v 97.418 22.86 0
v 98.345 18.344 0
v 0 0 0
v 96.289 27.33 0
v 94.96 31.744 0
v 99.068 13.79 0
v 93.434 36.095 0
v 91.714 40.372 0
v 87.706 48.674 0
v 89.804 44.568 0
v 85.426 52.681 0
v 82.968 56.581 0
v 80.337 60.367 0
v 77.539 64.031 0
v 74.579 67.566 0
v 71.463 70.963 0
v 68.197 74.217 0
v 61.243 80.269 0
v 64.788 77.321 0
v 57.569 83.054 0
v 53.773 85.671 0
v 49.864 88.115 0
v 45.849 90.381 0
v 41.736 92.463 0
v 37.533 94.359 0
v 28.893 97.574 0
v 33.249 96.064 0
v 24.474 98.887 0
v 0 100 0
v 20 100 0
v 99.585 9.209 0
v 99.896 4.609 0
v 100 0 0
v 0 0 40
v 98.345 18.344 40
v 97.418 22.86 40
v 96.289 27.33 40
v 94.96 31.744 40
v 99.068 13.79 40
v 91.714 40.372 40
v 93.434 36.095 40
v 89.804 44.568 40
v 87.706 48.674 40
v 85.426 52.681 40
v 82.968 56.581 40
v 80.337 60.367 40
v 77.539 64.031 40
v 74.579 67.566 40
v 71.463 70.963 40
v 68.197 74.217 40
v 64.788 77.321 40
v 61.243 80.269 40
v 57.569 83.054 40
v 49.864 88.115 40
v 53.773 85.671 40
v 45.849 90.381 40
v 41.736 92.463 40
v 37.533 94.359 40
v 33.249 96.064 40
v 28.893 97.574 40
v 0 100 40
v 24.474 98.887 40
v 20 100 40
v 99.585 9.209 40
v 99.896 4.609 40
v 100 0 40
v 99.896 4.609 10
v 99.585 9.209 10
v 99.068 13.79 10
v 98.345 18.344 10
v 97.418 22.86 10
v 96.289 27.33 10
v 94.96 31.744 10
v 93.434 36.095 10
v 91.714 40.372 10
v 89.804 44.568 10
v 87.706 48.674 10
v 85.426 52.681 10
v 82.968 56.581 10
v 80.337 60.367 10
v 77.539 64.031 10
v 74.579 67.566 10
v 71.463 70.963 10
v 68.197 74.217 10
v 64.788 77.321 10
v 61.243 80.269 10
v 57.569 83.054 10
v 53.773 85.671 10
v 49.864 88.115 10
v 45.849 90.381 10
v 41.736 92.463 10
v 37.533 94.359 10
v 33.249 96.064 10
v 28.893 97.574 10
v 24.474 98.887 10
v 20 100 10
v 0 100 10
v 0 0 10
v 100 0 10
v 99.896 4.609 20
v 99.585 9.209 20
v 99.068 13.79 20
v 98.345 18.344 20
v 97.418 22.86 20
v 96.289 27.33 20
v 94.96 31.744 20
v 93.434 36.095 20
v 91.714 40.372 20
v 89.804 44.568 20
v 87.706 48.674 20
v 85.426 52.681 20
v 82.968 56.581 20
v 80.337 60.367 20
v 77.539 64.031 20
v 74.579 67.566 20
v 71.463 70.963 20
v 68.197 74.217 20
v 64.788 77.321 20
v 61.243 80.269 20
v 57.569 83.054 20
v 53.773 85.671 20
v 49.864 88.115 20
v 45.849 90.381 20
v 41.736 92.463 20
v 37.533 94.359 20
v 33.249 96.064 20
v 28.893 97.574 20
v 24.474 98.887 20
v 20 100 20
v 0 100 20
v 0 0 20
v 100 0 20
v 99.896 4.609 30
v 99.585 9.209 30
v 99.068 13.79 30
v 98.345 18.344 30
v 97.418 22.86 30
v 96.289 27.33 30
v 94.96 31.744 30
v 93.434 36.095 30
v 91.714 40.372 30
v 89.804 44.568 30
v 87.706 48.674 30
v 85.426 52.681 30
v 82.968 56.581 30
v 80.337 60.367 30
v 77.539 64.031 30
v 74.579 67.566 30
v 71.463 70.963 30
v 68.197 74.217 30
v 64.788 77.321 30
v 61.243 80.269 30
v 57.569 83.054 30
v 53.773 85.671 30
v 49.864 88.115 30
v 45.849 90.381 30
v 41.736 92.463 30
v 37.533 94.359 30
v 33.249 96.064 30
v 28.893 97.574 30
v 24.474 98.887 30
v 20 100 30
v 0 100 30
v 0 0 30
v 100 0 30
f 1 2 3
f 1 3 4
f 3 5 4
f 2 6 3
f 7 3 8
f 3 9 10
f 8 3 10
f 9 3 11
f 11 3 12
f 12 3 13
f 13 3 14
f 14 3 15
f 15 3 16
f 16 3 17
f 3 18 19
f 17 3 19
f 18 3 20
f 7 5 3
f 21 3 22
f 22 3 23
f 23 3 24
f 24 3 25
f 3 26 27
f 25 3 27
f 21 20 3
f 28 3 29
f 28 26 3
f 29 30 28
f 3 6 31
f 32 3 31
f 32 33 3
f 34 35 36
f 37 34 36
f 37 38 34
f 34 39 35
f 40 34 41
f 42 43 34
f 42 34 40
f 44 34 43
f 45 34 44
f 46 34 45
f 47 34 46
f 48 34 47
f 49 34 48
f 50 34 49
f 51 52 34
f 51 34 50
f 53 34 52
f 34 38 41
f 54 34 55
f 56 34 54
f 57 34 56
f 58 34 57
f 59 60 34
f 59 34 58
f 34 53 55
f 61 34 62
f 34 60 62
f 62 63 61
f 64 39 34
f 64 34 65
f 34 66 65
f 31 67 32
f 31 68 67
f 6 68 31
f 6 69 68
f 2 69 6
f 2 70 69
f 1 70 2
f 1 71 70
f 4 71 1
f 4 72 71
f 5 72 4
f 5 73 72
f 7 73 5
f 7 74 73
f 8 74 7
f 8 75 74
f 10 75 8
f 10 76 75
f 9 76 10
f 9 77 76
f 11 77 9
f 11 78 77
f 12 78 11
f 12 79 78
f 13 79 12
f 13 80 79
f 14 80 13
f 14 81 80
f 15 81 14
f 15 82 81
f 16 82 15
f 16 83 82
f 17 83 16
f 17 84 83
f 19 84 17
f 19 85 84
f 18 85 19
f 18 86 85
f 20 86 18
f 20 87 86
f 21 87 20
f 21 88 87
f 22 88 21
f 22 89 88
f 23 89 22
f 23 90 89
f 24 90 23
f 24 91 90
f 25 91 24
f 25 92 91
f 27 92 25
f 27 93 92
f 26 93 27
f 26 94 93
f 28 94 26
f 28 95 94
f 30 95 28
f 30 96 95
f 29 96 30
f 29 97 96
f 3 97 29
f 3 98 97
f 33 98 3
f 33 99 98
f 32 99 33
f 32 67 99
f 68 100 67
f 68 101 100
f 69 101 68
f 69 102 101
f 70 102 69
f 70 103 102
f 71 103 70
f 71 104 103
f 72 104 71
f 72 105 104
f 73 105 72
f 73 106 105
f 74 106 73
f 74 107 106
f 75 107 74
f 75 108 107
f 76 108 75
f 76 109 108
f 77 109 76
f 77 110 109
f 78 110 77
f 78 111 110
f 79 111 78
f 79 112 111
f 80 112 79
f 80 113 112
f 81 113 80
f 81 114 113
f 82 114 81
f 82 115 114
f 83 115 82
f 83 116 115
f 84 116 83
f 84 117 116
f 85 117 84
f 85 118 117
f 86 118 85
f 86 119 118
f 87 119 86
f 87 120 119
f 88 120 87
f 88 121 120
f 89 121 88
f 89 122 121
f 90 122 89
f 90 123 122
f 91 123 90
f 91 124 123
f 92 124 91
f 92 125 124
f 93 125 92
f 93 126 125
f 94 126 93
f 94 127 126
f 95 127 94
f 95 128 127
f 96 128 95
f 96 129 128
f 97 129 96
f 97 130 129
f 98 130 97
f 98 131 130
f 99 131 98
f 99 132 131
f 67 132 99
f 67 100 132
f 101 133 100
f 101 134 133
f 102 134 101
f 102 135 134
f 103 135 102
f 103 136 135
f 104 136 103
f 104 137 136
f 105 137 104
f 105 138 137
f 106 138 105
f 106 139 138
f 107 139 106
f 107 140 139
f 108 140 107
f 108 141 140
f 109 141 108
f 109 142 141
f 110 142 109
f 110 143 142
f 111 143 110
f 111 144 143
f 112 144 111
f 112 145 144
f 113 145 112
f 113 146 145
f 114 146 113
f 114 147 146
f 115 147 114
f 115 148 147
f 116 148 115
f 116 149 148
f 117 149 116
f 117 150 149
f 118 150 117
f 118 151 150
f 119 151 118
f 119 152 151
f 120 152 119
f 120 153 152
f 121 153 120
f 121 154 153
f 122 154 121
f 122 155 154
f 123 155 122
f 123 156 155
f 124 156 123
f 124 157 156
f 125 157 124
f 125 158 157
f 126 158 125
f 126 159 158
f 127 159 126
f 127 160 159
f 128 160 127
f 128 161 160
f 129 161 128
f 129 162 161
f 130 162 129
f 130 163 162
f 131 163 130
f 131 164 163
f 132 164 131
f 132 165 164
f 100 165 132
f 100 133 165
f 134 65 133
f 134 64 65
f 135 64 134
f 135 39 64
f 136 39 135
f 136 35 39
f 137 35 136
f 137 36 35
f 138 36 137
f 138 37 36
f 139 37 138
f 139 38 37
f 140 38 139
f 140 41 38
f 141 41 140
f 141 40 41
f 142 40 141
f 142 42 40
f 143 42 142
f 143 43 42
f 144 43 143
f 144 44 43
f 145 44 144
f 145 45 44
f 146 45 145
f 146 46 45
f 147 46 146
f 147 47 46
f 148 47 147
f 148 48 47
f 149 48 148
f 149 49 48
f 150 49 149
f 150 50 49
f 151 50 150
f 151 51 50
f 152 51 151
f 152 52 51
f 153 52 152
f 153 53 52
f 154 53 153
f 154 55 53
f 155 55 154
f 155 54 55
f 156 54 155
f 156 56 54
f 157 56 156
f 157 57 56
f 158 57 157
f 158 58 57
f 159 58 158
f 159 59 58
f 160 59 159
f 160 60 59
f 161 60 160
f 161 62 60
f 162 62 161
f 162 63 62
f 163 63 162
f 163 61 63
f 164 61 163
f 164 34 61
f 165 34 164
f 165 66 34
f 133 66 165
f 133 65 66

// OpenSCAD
// Start: lazy_union
default_5_default_5();
// End: lazy_union

// Modules.

// 'PartMaterial undef-default - undef-default'
module default_5_default_5() {
  // 'None : _combine_solids_and_holes'
  union() {
    linear_extrude(height=40.0, twist=0.0, slices=4, scale=[1.0, 1.0], $fn=30) {
      polygon(points=[[0.0, 0.0], [100.0, 0.0], [99.89631588001659, 4.609175002087101], [99.58547328390507, 9.209025160194866], [99.06810107880757, 13.79024449548039], [98.34524596290532, 18.343564721207464], [97.41837034783867, 22.85977399346182], [96.28934940009508, 27.329735547676524], [94.96046724735083, 31.744406183264097], [93.43441235744142, 36.09485455895882], [91.71427209930943, 40.372279261855994], [89.8035264969336, 44.56802661359237], [87.7060411888758, 48.6736081776443], [85.4260596076891, 52.6807179323242], [82.96819439500906, 56.58124907473271], [80.33741806969647, 60.367310421670474], [77.5390529679106, 64.03124237432849], [74.57876047546554, 67.56563241445913], [71.46252957425342, 70.96333010067725], [68.19666472590659, 74.21746153455233], [64.78777311721109, 77.3214432672252], [61.24275129307556, 80.26899561841493], [57.56877120409817, 83.05415538087006], [53.77326569695918, 85.67128788456164], [49.863913476993204, 88.11509839621112], [45.84862357336381, 90.38064283109061], [41.7355193382688, 92.46333775542416], [37.53292201254748, 94.35896965915477], [33.24933389093864, 96.06370348031658], [28.89342112104732, 97.57409036376706], [24.473996170820325, 98.88707463858242], [20.000000000000007, 100.0], [0.0, 100.0]]);
    }
  }
} // end module default_5_default_5
